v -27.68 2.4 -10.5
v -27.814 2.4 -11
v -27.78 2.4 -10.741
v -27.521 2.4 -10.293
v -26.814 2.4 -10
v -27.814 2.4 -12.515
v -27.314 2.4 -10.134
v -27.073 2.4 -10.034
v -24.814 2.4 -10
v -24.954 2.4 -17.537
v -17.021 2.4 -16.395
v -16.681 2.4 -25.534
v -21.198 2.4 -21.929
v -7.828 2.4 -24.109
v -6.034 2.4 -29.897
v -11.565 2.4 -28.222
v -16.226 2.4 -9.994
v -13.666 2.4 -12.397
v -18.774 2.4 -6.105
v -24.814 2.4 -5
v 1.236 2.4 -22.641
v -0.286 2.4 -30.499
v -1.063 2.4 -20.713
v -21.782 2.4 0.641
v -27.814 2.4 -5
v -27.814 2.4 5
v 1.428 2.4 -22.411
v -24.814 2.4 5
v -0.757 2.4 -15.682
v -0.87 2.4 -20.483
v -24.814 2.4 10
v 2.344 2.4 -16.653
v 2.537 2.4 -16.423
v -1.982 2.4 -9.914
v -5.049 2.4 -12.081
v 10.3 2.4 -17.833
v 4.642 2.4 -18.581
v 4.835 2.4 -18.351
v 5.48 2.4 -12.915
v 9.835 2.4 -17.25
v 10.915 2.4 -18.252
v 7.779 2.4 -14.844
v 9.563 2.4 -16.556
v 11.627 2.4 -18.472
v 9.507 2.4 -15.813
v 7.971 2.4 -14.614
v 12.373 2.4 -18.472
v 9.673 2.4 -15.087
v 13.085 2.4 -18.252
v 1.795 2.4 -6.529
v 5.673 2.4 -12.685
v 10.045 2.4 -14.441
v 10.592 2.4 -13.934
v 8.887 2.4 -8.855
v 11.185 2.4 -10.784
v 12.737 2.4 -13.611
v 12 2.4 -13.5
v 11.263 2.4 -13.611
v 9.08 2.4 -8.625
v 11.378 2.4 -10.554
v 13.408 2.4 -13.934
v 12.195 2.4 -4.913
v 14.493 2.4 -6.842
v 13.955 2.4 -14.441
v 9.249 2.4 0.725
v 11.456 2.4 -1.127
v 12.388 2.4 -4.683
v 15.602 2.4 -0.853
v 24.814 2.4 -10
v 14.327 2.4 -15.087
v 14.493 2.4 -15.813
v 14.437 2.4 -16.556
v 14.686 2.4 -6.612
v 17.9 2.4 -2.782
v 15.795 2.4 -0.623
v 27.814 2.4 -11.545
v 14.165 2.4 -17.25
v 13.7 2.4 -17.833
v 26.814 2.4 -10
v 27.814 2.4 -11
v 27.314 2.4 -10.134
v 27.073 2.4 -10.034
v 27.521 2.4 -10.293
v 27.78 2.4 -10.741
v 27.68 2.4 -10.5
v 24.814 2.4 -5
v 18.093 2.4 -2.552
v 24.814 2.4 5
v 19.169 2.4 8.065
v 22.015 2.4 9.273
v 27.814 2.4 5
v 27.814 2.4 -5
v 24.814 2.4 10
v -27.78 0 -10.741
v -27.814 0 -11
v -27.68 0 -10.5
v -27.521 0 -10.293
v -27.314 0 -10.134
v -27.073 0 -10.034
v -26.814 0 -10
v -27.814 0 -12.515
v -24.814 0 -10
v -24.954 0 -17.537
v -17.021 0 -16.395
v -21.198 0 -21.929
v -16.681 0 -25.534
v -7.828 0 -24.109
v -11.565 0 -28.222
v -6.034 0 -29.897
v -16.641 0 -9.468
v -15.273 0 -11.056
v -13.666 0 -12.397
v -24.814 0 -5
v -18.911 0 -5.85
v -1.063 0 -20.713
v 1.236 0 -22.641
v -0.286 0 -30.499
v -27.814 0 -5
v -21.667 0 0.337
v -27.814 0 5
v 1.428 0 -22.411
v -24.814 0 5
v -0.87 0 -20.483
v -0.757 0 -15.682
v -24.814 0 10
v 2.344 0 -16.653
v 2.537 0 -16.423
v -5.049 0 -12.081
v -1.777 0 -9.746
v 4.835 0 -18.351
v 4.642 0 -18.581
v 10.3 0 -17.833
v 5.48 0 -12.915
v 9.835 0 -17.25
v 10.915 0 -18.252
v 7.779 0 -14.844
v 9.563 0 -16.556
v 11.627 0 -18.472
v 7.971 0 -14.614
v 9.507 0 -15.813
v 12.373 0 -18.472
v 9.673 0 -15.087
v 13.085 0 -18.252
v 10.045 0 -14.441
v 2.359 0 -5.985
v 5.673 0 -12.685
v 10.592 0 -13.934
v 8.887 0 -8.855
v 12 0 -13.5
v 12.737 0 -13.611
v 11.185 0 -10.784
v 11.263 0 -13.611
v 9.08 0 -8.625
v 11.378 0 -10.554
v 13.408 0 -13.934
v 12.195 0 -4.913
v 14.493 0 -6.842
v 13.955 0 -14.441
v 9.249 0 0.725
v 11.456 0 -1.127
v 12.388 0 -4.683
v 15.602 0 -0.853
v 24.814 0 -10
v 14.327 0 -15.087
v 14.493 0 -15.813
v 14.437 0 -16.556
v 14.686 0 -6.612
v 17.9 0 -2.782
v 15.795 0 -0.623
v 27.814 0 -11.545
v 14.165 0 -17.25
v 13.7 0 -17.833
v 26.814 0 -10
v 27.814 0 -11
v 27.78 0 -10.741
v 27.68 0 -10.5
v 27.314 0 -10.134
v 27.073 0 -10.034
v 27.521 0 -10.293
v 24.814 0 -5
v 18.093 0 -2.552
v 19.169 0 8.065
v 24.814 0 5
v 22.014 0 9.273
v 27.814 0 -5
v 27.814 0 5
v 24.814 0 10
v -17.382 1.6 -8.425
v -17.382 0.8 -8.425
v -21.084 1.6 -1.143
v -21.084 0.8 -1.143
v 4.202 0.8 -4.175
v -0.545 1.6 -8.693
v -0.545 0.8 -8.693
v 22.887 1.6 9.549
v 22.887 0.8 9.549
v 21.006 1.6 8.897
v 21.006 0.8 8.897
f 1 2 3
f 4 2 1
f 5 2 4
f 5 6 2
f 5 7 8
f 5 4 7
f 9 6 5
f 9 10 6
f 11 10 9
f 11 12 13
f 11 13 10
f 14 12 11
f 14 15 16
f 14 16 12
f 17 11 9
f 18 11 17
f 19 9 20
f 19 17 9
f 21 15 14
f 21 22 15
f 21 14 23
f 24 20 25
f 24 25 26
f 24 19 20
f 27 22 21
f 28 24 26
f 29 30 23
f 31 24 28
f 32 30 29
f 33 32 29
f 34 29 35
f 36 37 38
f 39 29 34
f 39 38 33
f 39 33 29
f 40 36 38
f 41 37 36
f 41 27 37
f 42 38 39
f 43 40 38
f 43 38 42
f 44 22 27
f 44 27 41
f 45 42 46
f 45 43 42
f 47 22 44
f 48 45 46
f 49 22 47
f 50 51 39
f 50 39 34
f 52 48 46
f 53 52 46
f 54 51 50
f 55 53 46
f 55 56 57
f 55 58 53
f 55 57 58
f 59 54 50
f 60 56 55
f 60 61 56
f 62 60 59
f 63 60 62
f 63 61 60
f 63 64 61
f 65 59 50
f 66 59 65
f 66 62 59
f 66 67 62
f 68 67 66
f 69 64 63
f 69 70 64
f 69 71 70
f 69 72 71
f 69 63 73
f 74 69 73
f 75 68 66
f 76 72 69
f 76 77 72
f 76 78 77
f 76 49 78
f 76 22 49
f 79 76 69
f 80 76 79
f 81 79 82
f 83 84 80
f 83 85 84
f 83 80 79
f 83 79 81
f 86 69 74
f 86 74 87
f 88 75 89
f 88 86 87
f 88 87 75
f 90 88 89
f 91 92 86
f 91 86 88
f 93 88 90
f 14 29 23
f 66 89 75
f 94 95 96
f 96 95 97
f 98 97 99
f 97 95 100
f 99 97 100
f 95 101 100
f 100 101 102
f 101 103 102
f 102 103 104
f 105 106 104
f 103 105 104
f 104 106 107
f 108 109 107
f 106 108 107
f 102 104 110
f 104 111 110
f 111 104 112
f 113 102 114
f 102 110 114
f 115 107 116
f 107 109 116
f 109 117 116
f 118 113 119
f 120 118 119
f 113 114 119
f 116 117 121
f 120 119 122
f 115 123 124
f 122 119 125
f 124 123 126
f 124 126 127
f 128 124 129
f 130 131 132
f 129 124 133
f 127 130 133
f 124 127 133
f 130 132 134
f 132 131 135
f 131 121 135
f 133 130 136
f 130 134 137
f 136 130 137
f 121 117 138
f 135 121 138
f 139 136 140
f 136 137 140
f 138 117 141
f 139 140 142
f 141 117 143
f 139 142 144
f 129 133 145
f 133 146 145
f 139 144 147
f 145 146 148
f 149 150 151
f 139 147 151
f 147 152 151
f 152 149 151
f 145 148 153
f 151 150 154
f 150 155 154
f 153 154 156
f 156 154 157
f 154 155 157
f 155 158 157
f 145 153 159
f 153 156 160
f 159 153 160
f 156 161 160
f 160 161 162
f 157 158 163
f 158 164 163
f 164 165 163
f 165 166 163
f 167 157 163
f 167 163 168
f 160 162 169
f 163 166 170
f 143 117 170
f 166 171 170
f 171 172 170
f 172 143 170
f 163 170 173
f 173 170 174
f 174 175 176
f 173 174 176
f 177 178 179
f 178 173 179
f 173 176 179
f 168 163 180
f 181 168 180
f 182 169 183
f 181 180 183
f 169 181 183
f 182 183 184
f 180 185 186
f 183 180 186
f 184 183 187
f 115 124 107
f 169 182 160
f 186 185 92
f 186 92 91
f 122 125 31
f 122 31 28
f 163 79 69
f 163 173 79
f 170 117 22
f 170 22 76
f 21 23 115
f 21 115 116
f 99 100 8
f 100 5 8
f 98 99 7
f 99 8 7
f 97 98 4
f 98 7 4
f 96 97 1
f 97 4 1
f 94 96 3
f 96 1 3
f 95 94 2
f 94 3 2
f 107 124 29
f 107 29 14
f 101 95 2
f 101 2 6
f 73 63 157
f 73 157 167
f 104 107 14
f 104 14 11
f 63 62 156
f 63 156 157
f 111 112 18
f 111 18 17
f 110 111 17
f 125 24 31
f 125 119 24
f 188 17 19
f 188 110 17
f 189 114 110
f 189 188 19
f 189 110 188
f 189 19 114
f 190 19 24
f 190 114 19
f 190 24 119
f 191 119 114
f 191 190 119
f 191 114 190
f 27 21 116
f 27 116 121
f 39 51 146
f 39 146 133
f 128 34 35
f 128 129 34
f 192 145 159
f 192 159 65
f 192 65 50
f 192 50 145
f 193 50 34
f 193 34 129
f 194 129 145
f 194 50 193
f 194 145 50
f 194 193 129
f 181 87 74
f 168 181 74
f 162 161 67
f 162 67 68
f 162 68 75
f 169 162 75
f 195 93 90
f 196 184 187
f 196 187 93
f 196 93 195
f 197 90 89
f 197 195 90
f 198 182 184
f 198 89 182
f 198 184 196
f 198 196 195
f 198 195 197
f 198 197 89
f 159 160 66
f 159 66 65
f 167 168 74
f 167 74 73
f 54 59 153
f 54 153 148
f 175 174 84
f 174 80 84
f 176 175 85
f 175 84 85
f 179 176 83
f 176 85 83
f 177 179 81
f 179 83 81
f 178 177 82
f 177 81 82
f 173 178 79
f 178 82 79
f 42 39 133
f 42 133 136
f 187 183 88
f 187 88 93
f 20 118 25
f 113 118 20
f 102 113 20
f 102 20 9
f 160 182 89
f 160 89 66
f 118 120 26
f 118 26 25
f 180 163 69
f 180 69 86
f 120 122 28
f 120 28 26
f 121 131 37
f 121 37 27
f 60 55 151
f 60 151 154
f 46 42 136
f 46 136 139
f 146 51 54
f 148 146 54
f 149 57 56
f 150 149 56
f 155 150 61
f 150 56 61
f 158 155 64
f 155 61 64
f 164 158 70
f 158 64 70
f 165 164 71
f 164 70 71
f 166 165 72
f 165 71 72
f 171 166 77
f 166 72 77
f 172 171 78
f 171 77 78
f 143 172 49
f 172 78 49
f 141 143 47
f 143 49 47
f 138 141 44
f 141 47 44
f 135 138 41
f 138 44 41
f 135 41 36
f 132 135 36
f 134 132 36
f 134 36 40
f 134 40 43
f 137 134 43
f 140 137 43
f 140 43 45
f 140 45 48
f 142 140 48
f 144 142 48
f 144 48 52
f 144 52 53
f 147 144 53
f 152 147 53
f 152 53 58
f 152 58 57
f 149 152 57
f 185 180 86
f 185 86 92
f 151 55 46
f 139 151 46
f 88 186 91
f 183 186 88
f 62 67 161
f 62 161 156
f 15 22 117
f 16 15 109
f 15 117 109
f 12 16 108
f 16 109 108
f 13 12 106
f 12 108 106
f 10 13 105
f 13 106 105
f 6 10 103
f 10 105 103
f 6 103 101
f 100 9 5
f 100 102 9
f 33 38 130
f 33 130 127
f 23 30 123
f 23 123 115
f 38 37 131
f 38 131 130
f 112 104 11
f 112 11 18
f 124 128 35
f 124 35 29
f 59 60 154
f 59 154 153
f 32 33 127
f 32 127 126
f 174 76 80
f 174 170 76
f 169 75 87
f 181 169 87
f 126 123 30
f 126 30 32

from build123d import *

# Parameters (mm, degrees)
CROQUIS1_R                 = 30.5
SALIENTE_EXTRUIR1_DEPTH    = 2.4
CROQUIS2_R                 = 2
CORTAR_EXTRUIR1_DEPTH      = 4
CORTAR_EXTRUIR3_START      = -4
CORTAR_EXTRUIR3_DEPTH      = 4
CORTAR_EXTRUIR5_START      = -4
CORTAR_EXTRUIR5_DEPTH      = 4
CORTAR_EXTRUIR6_DEPTH      = 10
CROQUIS10_R                = 2.5
CORTAR_EXTRUIR7_DEPTH      = 3
CORTAR_EXTRUIR8_DEPTH      = 44.200231628
CORTAR_EXTRUIR8_DEPTH_BACK = 44.200231628
CORTAR_EXTRUIR9_START      = -10
CORTAR_EXTRUIR9_DEPTH      = 10
REDONDEO1_R                = 1
CORTAR_EXTRUIR10_DEPTH     = 3


with BuildPart() as part:
    # Croquis1 → Saliente-Extruir1 (new body)
    with BuildSketch(Plane(origin=(0, 0, 0), x_dir=(1, 0, 0), z_dir=(0, 1, 0))):
        with Locations(Location((0, 0, 0), (0, 0, 270))):
            Circle(CROQUIS1_R)
    extrude(amount=SALIENTE_EXTRUIR1_DEPTH)

    # Croquis2 → Cortar-Extruir1 (cut)
    with BuildSketch(Plane(origin=(0, 2.4, 0), x_dir=(1, 0, 0), z_dir=(0, 1, 0))):
        with Locations(Location((0, 0, 0), (0, 0, 270))):
            Circle(CROQUIS2_R)
    extrude(amount=-CORTAR_EXTRUIR1_DEPTH, mode=Mode.SUBTRACT)

    # Croquis5 → Cortar-Extruir3 (cut)
    with BuildSketch(Plane(origin=(0, 2.4, 0), x_dir=(1, 0, 0), z_dir=(0, 1, 0)).offset(CORTAR_EXTRUIR3_START)):
        with BuildLine():
            Line((28.814059068, 5), (30.087372767, 5))
            ThreePointArc((30.087372767, 5), (29.556634924, 7.526973624), (28.814059068, 10))
            Line((28.814059068, 10), (24.814059068, 10))
            Line((24.814059068, 10), (24.814059068, 5))
            Line((24.814059068, 5), (28.814059068, 5))
        make_face()
        with BuildLine():
            Line((30.087372767, -5), (28.814059068, -5))
            Line((28.814059068, -5), (24.814059068, -5))
            Line((24.814059068, -5), (24.814059068, -10))
            Line((24.814059068, -10), (28.814059068, -10))
            ThreePointArc((28.814059068, -10), (29.556634924, -7.526973624), (30.087372767, -5))
        make_face()
        with BuildLine():
            Line((-24.814059068, 5), (-24.814059068, 10))
            Line((-24.814059068, 10), (-28.814059068, 10))
            ThreePointArc((-28.814059068, 10), (-29.556634924, 7.526973624), (-30.087372767, 5))
            Line((-30.087372767, 5), (-28.814059068, 5))
            Line((-28.814059068, 5), (-24.814059068, 5))
        make_face()
        with BuildLine():
            Line((-28.814059068, -10), (-24.814059068, -10))
            Line((-24.814059068, -10), (-24.814059068, -5))
            Line((-24.814059068, -5), (-28.814059068, -5))
            Line((-28.814059068, -5), (-30.087372767, -5))
            ThreePointArc((-30.087372767, -5), (-29.556634924, -7.526973624), (-28.814059068, -10))
        make_face()
    extrude(amount=CORTAR_EXTRUIR3_DEPTH, mode=Mode.SUBTRACT)

    # Croquis7 → Cortar-Extruir5 (cut)
    with BuildSketch(Plane(origin=(0, 2.4, 0), x_dir=(1, 0, 0), z_dir=(0, 1, 0)).offset(CORTAR_EXTRUIR5_START)):
        Polygon((1.428390211, 22.411430151), (-0.869743118, 20.483067322), (2.34419493, 16.652845106), (4.642328259, 18.581207935), align=None)
        with BuildLine():
            Line((-24.814059068, -10), (-28.814059068, -10))
            ThreePointArc((-28.814059068, -10), (0, -30.5), (28.814059068, -10))
            Line((28.814059068, -10), (24.814059068, -10))
            add(Edge.make_bspline(
                [(24.814059068, -10), (22.863263717, -9.657344338), (20.984021298, -8.980450277), (19.168992989, -8.065339906)],
                knots=[0, 0, 0, 0, 0.087850084, 0.087850084, 0.087850084, 0.087850084], degree=3))
            Line((19.168992989, -8.065339906), (11.455541673, 1.127193412))
            Line((11.455541673, 1.127193412), (9.248678515, -0.72458465))
            add(Edge.make_bspline(
                [(9.248678515, -0.72458465), (4.033234859, 4.116641048), (-0.646914404, 9.508508747), (-5.04935939, 12.080675515)],
                knots=[0.258799312, 0.258799312, 0.258799312, 0.258799312, 0.546435258, 0.546435258, 0.546435258, 0.546435258], degree=3))
            Line((-5.04935939, 12.080675515), (-0.757422911, 15.682037831))
            Line((-0.757422911, 15.682037831), (-7.828086618, 24.108526705))
            Line((-7.828086618, 24.108526705), (-17.020619935, 16.395075389))
            Line((-17.020619935, 16.395075389), (-13.66601447, 12.397212273))
            add(Edge.make_bspline(
                [(-13.66601447, 12.397212273), (-17.403465693, 9.897923685), (-21.056529869, 3.255841362), (-24.814059068, -10)],
                knots=[0.740637404, 0.740637404, 0.740637404, 0.740637404, 1, 1, 1, 1], degree=3))
        make_face()
        Polygon((14.685884661, 6.611763511), (12.387751331, 4.683400682), (15.60168938, 0.853178467), (17.899822709, 2.781541296), align=None)
    extrude(amount=CORTAR_EXTRUIR5_DEPTH, mode=Mode.SUBTRACT)

    # Croquis9 → Cortar-Extruir6 (cut)
    with BuildSketch(Plane(origin=(0, 2.4, 0), x_dir=(1, 0, 0), z_dir=(0, 1, 0))):
        Polygon((7.971418181, 14.613753061), (5.673284852, 12.685390231), (8.887222901, 8.855168016), (11.18535623, 10.783530845), align=None)
    extrude(amount=-CORTAR_EXTRUIR6_DEPTH, mode=Mode.SUBTRACT)

    # Croquis10 → Cortar-Extruir7 (cut)
    with BuildSketch(Plane(origin=(0, 2.4, 0), x_dir=(1, 0, 0), z_dir=(0, 1, 0))):
        with Locations(Location((12, 16, 0), (0, 0, 270))):
            Circle(CROQUIS10_R)
    extrude(amount=-CORTAR_EXTRUIR7_DEPTH, mode=Mode.SUBTRACT)

    # Croquis11 → Cortar-Extruir8 (cut, two sides: drawn at the far end of the back side and taken through both)
    with BuildSketch(Plane(origin=(0, 2.4, 0), x_dir=(1, 0, 0), z_dir=(0, 1, 0)).offset(-CORTAR_EXTRUIR8_DEPTH_BACK)):
        with BuildLine():
            Line((30.087372767, 5), (27.814059068, 5))
            Line((27.814059068, 5), (27.814059068, -5))
            Line((27.814059068, -5), (30.087372767, -5))
            ThreePointArc((30.087372767, -5), (30.5, 0), (30.087372767, 5))
        make_face()
        with BuildLine():
            ThreePointArc((28.814059068, 10), (28.341972277, 11.268655974), (27.814059068, 12.515115586))
            Line((27.814059068, 12.515115586), (27.814059068, 10))
            Line((27.814059068, 10), (28.814059068, 10))
        make_face()
        with BuildLine():
            Line((-27.814059068, -5), (-27.814059068, 5))
            Line((-27.814059068, 5), (-30.087372767, 5))
            ThreePointArc((-30.087372767, 5), (-30.5, 0), (-30.087372767, -5))
            Line((-30.087372767, -5), (-27.814059068, -5))
        make_face()
        with BuildLine():
            Line((-28.814059068, 10), (-27.814059068, 10))
            Line((-27.814059068, 10), (-27.814059068, 12.515115586))
            ThreePointArc((-27.814059068, 12.515115586), (-28.341972277, 11.268655974), (-28.814059068, 10))
        make_face()
    extrude(amount=CORTAR_EXTRUIR8_DEPTH + CORTAR_EXTRUIR8_DEPTH_BACK, mode=Mode.SUBTRACT)

    # Croquis12 → Cortar-Extruir9 (cut)
    with BuildSketch(Plane(origin=(0, 2.4, 0), x_dir=(1, 0, 0), z_dir=(0, 1, 0)).offset(CORTAR_EXTRUIR9_START)):
        with BuildLine():
            Line((-0.28585192, 30.498660441), (27.814059068, 11.545031156))
            Line((27.814059068, 11.545031156), (27.814059068, 12.515115586))
            ThreePointArc((27.814059068, 12.515115586), (16.440879495, 25.689442995), (-0.28585192, 30.498660441))
        make_face()
    extrude(amount=CORTAR_EXTRUIR9_DEPTH, mode=Mode.SUBTRACT)

    # Redondeo1
    redondeo1_edges = [part.edges().sort_by_distance(p)[0] for p in [
        (27.814059068, 1.2, -10),
        (-27.814059068, 1.2, -10),
    ]]
    fillet(redondeo1_edges, radius=REDONDEO1_R)

    # Croquis13 → Cortar-Extruir10 (cut)
    with BuildSketch(Plane(origin=(0, 2.4, 0), x_dir=(1, 0, 0), z_dir=(0, 1, 0))):
        Polygon((1.428390211, 22.411430151), (-0.869743118, 20.483067322), (-1.062579401, 20.712880655), (1.235553928, 22.641243484), align=None)
        Polygon((2.34419493, 16.652845106), (4.642328259, 18.581207935), (4.835164542, 18.351394602), (2.537031213, 16.423031773), align=None)
        Polygon((7.971418181, 14.613753061), (5.673284852, 12.685390231), (5.480448569, 12.915203564), (7.778581899, 14.843566393), align=None)
        Polygon((8.887222901, 8.855168016), (11.18535623, 10.783530845), (11.378192513, 10.553717512), (9.080059183, 8.625354683), align=None)
        Polygon((14.685884661, 6.611763511), (12.387751331, 4.683400682), (12.194915048, 4.913214015), (14.493048378, 6.841576844), align=None)
        Polygon((17.899822709, 2.781541296), (15.60168938, 0.853178467), (15.794525663, 0.623365134), (18.092658992, 2.551727963), align=None)
    extrude(amount=-CORTAR_EXTRUIR10_DEPTH, mode=Mode.SUBTRACT)


solid = part.part
